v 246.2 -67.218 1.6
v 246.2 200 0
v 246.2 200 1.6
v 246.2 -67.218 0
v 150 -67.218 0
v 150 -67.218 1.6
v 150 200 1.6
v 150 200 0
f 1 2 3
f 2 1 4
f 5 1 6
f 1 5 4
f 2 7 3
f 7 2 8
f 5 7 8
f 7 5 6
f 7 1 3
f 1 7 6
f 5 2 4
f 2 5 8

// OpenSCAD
breadth = 100;
depth = 20;

height = breadth;
wall = 2;
slope = 4.3987;

notch = wall/4;
slot = wall;
slath = height/3;
thin = 0.8;
give = .4;

buttspan = .1875 * breadth * 4;
butttail = 1.4 * depth * 2;
buttslope = 1.27*45;

*union() {
    cube([breadth,depth,wall]);

    
difference() {
union() {
    translate([wall,0,0]) rotate([slope,0,0]) cube([breadth-(wall-notch)*2,slot,slath]);
    
    translate([wall,wall*2,0]) rotate([slope,0,0]) cube([breadth-(wall-notch)*2,thin,slath]);
    }

    translate([0,-wall*2,wall*2]) translate([wall*2,0,0]) rotate([slope,0,0]) color([0.7,0.3,0.3]) cube([breadth-(wall-notch)*5,wall*5,slath-wall]);
}
    
    

difference() {
union() {
    translate([wall,depth-wall,0]) rotate([slope,0,0]) cube([breadth-(wall-notch)*2,slot,slath]);
    
    translate([wall,depth-wall*2-thin,0]) rotate([slope,0,0]) cube([breadth-(wall-notch)*2,thin,slath]);   
    
    }
    
    translate([0,-wall*2,wall*2]) translate([wall*2,depth-wall,0]) rotate([slope,0,0]) color([0.7,0.3,0.3]) cube([breadth-(wall-notch)*5,wall*3,slath-wall]);
}

        
    
difference() {
    union() { 

        rotate([slope,0,0]) cube([wall,depth,height]);
        translate([breadth-wall,0,0]) rotate([slope,0,0]) cube([wall,depth,height]);

        translate([breadth/2-buttspan/4,butttail/3,-butttail*sqrt(2)/2]) rotate([buttslope,0,0]) color([1,0,0]) cube([buttspan/2,butttail,butttail]);
    }
    
        translate([breadth/2-buttspan/2,wall,-wall*2]) color([0,.5,.5]) rotate([slope,0,0]) cube(buttspan, butttail, butttail);
   
        translate([breadth/2-buttspan/2,-buttspan/1.25,-buttspan*1.5]) color([0,.5,.5]) cube([buttspan, buttspan*1.5,buttspan*1.5]);
    
    translate([wall-notch,wall,wall-notch]) color([0,0,1]) rotate([slope,0,0]) cube([breadth-(wall-notch)*2,slot,height]);
    
    translate([wall-notch,depth-wall*2,wall-notch]) color([0,0,1]) rotate([slope,0,0]) cube([breadth-(wall-notch)*2,slot,height]);
}

}

length = breadth-(wall-notch+give)*2;

translate([breadth*1.5,height*2,0]) { 

//sten = "";
sten = "hack_tower.png";
stenw = 202;
stenh = 580;
tower = length/stenw*stenh;
scale = tower/stenh*.90;
grays = 1/256;
hollow = wall-1.5;
gutter = 9;
    
echo(hollow);


    union()    {
    difference() {
union() {
    rotate([90,0,0]) color([0,1,0]) cube([length,slot-give,tower-gutter]);

   * rotate([90,0,0]) color([0,0,1]) cube([breadth,slot-give,height]);
}

    translate([breadth-breadth*.95,-tower*.95+gutter,wall-hollow+1]) scale([scale,scale,grays*wall*slot*2]) surface(file=sten, invert=true); 
    }
    
    *for(i = [20+gutter:26:tower*.9]) {
    translate([i<tower*.6?0:length*.3,i-tower,0]) color([.5,0,.5]) cube([i<tower*.6?length:(length*.4), thin, thin]);
    }
    
    *translate([0,35-tower,0]) color([.5,0,.5]) cube([length, thin, thin]);
    
    *translate([length/2+.5,-tower*.341+gutter+1,0]) color([.5,0,.5]) cube([thin,15,thin]);
}
}


*render() {
translate([0,depth*4,0]) { 

sten = "test.png";
stenw = 400;
stenh = 400;
scale = slath/stenh*.9;
grays = 1/256;
hollow = wall-1.5;
echo(hollow);

    difference() {
        rotate([90,0,0]) color([0,1,0]) cube([length,slot-give,slath]);

        translate([length/2-stenh*scale/2,-slath*.95,wall-hollow+1]) scale([scale,scale,grays*wall*slot*2]) surface(file=sten, invert=true); 
    }
}
}
